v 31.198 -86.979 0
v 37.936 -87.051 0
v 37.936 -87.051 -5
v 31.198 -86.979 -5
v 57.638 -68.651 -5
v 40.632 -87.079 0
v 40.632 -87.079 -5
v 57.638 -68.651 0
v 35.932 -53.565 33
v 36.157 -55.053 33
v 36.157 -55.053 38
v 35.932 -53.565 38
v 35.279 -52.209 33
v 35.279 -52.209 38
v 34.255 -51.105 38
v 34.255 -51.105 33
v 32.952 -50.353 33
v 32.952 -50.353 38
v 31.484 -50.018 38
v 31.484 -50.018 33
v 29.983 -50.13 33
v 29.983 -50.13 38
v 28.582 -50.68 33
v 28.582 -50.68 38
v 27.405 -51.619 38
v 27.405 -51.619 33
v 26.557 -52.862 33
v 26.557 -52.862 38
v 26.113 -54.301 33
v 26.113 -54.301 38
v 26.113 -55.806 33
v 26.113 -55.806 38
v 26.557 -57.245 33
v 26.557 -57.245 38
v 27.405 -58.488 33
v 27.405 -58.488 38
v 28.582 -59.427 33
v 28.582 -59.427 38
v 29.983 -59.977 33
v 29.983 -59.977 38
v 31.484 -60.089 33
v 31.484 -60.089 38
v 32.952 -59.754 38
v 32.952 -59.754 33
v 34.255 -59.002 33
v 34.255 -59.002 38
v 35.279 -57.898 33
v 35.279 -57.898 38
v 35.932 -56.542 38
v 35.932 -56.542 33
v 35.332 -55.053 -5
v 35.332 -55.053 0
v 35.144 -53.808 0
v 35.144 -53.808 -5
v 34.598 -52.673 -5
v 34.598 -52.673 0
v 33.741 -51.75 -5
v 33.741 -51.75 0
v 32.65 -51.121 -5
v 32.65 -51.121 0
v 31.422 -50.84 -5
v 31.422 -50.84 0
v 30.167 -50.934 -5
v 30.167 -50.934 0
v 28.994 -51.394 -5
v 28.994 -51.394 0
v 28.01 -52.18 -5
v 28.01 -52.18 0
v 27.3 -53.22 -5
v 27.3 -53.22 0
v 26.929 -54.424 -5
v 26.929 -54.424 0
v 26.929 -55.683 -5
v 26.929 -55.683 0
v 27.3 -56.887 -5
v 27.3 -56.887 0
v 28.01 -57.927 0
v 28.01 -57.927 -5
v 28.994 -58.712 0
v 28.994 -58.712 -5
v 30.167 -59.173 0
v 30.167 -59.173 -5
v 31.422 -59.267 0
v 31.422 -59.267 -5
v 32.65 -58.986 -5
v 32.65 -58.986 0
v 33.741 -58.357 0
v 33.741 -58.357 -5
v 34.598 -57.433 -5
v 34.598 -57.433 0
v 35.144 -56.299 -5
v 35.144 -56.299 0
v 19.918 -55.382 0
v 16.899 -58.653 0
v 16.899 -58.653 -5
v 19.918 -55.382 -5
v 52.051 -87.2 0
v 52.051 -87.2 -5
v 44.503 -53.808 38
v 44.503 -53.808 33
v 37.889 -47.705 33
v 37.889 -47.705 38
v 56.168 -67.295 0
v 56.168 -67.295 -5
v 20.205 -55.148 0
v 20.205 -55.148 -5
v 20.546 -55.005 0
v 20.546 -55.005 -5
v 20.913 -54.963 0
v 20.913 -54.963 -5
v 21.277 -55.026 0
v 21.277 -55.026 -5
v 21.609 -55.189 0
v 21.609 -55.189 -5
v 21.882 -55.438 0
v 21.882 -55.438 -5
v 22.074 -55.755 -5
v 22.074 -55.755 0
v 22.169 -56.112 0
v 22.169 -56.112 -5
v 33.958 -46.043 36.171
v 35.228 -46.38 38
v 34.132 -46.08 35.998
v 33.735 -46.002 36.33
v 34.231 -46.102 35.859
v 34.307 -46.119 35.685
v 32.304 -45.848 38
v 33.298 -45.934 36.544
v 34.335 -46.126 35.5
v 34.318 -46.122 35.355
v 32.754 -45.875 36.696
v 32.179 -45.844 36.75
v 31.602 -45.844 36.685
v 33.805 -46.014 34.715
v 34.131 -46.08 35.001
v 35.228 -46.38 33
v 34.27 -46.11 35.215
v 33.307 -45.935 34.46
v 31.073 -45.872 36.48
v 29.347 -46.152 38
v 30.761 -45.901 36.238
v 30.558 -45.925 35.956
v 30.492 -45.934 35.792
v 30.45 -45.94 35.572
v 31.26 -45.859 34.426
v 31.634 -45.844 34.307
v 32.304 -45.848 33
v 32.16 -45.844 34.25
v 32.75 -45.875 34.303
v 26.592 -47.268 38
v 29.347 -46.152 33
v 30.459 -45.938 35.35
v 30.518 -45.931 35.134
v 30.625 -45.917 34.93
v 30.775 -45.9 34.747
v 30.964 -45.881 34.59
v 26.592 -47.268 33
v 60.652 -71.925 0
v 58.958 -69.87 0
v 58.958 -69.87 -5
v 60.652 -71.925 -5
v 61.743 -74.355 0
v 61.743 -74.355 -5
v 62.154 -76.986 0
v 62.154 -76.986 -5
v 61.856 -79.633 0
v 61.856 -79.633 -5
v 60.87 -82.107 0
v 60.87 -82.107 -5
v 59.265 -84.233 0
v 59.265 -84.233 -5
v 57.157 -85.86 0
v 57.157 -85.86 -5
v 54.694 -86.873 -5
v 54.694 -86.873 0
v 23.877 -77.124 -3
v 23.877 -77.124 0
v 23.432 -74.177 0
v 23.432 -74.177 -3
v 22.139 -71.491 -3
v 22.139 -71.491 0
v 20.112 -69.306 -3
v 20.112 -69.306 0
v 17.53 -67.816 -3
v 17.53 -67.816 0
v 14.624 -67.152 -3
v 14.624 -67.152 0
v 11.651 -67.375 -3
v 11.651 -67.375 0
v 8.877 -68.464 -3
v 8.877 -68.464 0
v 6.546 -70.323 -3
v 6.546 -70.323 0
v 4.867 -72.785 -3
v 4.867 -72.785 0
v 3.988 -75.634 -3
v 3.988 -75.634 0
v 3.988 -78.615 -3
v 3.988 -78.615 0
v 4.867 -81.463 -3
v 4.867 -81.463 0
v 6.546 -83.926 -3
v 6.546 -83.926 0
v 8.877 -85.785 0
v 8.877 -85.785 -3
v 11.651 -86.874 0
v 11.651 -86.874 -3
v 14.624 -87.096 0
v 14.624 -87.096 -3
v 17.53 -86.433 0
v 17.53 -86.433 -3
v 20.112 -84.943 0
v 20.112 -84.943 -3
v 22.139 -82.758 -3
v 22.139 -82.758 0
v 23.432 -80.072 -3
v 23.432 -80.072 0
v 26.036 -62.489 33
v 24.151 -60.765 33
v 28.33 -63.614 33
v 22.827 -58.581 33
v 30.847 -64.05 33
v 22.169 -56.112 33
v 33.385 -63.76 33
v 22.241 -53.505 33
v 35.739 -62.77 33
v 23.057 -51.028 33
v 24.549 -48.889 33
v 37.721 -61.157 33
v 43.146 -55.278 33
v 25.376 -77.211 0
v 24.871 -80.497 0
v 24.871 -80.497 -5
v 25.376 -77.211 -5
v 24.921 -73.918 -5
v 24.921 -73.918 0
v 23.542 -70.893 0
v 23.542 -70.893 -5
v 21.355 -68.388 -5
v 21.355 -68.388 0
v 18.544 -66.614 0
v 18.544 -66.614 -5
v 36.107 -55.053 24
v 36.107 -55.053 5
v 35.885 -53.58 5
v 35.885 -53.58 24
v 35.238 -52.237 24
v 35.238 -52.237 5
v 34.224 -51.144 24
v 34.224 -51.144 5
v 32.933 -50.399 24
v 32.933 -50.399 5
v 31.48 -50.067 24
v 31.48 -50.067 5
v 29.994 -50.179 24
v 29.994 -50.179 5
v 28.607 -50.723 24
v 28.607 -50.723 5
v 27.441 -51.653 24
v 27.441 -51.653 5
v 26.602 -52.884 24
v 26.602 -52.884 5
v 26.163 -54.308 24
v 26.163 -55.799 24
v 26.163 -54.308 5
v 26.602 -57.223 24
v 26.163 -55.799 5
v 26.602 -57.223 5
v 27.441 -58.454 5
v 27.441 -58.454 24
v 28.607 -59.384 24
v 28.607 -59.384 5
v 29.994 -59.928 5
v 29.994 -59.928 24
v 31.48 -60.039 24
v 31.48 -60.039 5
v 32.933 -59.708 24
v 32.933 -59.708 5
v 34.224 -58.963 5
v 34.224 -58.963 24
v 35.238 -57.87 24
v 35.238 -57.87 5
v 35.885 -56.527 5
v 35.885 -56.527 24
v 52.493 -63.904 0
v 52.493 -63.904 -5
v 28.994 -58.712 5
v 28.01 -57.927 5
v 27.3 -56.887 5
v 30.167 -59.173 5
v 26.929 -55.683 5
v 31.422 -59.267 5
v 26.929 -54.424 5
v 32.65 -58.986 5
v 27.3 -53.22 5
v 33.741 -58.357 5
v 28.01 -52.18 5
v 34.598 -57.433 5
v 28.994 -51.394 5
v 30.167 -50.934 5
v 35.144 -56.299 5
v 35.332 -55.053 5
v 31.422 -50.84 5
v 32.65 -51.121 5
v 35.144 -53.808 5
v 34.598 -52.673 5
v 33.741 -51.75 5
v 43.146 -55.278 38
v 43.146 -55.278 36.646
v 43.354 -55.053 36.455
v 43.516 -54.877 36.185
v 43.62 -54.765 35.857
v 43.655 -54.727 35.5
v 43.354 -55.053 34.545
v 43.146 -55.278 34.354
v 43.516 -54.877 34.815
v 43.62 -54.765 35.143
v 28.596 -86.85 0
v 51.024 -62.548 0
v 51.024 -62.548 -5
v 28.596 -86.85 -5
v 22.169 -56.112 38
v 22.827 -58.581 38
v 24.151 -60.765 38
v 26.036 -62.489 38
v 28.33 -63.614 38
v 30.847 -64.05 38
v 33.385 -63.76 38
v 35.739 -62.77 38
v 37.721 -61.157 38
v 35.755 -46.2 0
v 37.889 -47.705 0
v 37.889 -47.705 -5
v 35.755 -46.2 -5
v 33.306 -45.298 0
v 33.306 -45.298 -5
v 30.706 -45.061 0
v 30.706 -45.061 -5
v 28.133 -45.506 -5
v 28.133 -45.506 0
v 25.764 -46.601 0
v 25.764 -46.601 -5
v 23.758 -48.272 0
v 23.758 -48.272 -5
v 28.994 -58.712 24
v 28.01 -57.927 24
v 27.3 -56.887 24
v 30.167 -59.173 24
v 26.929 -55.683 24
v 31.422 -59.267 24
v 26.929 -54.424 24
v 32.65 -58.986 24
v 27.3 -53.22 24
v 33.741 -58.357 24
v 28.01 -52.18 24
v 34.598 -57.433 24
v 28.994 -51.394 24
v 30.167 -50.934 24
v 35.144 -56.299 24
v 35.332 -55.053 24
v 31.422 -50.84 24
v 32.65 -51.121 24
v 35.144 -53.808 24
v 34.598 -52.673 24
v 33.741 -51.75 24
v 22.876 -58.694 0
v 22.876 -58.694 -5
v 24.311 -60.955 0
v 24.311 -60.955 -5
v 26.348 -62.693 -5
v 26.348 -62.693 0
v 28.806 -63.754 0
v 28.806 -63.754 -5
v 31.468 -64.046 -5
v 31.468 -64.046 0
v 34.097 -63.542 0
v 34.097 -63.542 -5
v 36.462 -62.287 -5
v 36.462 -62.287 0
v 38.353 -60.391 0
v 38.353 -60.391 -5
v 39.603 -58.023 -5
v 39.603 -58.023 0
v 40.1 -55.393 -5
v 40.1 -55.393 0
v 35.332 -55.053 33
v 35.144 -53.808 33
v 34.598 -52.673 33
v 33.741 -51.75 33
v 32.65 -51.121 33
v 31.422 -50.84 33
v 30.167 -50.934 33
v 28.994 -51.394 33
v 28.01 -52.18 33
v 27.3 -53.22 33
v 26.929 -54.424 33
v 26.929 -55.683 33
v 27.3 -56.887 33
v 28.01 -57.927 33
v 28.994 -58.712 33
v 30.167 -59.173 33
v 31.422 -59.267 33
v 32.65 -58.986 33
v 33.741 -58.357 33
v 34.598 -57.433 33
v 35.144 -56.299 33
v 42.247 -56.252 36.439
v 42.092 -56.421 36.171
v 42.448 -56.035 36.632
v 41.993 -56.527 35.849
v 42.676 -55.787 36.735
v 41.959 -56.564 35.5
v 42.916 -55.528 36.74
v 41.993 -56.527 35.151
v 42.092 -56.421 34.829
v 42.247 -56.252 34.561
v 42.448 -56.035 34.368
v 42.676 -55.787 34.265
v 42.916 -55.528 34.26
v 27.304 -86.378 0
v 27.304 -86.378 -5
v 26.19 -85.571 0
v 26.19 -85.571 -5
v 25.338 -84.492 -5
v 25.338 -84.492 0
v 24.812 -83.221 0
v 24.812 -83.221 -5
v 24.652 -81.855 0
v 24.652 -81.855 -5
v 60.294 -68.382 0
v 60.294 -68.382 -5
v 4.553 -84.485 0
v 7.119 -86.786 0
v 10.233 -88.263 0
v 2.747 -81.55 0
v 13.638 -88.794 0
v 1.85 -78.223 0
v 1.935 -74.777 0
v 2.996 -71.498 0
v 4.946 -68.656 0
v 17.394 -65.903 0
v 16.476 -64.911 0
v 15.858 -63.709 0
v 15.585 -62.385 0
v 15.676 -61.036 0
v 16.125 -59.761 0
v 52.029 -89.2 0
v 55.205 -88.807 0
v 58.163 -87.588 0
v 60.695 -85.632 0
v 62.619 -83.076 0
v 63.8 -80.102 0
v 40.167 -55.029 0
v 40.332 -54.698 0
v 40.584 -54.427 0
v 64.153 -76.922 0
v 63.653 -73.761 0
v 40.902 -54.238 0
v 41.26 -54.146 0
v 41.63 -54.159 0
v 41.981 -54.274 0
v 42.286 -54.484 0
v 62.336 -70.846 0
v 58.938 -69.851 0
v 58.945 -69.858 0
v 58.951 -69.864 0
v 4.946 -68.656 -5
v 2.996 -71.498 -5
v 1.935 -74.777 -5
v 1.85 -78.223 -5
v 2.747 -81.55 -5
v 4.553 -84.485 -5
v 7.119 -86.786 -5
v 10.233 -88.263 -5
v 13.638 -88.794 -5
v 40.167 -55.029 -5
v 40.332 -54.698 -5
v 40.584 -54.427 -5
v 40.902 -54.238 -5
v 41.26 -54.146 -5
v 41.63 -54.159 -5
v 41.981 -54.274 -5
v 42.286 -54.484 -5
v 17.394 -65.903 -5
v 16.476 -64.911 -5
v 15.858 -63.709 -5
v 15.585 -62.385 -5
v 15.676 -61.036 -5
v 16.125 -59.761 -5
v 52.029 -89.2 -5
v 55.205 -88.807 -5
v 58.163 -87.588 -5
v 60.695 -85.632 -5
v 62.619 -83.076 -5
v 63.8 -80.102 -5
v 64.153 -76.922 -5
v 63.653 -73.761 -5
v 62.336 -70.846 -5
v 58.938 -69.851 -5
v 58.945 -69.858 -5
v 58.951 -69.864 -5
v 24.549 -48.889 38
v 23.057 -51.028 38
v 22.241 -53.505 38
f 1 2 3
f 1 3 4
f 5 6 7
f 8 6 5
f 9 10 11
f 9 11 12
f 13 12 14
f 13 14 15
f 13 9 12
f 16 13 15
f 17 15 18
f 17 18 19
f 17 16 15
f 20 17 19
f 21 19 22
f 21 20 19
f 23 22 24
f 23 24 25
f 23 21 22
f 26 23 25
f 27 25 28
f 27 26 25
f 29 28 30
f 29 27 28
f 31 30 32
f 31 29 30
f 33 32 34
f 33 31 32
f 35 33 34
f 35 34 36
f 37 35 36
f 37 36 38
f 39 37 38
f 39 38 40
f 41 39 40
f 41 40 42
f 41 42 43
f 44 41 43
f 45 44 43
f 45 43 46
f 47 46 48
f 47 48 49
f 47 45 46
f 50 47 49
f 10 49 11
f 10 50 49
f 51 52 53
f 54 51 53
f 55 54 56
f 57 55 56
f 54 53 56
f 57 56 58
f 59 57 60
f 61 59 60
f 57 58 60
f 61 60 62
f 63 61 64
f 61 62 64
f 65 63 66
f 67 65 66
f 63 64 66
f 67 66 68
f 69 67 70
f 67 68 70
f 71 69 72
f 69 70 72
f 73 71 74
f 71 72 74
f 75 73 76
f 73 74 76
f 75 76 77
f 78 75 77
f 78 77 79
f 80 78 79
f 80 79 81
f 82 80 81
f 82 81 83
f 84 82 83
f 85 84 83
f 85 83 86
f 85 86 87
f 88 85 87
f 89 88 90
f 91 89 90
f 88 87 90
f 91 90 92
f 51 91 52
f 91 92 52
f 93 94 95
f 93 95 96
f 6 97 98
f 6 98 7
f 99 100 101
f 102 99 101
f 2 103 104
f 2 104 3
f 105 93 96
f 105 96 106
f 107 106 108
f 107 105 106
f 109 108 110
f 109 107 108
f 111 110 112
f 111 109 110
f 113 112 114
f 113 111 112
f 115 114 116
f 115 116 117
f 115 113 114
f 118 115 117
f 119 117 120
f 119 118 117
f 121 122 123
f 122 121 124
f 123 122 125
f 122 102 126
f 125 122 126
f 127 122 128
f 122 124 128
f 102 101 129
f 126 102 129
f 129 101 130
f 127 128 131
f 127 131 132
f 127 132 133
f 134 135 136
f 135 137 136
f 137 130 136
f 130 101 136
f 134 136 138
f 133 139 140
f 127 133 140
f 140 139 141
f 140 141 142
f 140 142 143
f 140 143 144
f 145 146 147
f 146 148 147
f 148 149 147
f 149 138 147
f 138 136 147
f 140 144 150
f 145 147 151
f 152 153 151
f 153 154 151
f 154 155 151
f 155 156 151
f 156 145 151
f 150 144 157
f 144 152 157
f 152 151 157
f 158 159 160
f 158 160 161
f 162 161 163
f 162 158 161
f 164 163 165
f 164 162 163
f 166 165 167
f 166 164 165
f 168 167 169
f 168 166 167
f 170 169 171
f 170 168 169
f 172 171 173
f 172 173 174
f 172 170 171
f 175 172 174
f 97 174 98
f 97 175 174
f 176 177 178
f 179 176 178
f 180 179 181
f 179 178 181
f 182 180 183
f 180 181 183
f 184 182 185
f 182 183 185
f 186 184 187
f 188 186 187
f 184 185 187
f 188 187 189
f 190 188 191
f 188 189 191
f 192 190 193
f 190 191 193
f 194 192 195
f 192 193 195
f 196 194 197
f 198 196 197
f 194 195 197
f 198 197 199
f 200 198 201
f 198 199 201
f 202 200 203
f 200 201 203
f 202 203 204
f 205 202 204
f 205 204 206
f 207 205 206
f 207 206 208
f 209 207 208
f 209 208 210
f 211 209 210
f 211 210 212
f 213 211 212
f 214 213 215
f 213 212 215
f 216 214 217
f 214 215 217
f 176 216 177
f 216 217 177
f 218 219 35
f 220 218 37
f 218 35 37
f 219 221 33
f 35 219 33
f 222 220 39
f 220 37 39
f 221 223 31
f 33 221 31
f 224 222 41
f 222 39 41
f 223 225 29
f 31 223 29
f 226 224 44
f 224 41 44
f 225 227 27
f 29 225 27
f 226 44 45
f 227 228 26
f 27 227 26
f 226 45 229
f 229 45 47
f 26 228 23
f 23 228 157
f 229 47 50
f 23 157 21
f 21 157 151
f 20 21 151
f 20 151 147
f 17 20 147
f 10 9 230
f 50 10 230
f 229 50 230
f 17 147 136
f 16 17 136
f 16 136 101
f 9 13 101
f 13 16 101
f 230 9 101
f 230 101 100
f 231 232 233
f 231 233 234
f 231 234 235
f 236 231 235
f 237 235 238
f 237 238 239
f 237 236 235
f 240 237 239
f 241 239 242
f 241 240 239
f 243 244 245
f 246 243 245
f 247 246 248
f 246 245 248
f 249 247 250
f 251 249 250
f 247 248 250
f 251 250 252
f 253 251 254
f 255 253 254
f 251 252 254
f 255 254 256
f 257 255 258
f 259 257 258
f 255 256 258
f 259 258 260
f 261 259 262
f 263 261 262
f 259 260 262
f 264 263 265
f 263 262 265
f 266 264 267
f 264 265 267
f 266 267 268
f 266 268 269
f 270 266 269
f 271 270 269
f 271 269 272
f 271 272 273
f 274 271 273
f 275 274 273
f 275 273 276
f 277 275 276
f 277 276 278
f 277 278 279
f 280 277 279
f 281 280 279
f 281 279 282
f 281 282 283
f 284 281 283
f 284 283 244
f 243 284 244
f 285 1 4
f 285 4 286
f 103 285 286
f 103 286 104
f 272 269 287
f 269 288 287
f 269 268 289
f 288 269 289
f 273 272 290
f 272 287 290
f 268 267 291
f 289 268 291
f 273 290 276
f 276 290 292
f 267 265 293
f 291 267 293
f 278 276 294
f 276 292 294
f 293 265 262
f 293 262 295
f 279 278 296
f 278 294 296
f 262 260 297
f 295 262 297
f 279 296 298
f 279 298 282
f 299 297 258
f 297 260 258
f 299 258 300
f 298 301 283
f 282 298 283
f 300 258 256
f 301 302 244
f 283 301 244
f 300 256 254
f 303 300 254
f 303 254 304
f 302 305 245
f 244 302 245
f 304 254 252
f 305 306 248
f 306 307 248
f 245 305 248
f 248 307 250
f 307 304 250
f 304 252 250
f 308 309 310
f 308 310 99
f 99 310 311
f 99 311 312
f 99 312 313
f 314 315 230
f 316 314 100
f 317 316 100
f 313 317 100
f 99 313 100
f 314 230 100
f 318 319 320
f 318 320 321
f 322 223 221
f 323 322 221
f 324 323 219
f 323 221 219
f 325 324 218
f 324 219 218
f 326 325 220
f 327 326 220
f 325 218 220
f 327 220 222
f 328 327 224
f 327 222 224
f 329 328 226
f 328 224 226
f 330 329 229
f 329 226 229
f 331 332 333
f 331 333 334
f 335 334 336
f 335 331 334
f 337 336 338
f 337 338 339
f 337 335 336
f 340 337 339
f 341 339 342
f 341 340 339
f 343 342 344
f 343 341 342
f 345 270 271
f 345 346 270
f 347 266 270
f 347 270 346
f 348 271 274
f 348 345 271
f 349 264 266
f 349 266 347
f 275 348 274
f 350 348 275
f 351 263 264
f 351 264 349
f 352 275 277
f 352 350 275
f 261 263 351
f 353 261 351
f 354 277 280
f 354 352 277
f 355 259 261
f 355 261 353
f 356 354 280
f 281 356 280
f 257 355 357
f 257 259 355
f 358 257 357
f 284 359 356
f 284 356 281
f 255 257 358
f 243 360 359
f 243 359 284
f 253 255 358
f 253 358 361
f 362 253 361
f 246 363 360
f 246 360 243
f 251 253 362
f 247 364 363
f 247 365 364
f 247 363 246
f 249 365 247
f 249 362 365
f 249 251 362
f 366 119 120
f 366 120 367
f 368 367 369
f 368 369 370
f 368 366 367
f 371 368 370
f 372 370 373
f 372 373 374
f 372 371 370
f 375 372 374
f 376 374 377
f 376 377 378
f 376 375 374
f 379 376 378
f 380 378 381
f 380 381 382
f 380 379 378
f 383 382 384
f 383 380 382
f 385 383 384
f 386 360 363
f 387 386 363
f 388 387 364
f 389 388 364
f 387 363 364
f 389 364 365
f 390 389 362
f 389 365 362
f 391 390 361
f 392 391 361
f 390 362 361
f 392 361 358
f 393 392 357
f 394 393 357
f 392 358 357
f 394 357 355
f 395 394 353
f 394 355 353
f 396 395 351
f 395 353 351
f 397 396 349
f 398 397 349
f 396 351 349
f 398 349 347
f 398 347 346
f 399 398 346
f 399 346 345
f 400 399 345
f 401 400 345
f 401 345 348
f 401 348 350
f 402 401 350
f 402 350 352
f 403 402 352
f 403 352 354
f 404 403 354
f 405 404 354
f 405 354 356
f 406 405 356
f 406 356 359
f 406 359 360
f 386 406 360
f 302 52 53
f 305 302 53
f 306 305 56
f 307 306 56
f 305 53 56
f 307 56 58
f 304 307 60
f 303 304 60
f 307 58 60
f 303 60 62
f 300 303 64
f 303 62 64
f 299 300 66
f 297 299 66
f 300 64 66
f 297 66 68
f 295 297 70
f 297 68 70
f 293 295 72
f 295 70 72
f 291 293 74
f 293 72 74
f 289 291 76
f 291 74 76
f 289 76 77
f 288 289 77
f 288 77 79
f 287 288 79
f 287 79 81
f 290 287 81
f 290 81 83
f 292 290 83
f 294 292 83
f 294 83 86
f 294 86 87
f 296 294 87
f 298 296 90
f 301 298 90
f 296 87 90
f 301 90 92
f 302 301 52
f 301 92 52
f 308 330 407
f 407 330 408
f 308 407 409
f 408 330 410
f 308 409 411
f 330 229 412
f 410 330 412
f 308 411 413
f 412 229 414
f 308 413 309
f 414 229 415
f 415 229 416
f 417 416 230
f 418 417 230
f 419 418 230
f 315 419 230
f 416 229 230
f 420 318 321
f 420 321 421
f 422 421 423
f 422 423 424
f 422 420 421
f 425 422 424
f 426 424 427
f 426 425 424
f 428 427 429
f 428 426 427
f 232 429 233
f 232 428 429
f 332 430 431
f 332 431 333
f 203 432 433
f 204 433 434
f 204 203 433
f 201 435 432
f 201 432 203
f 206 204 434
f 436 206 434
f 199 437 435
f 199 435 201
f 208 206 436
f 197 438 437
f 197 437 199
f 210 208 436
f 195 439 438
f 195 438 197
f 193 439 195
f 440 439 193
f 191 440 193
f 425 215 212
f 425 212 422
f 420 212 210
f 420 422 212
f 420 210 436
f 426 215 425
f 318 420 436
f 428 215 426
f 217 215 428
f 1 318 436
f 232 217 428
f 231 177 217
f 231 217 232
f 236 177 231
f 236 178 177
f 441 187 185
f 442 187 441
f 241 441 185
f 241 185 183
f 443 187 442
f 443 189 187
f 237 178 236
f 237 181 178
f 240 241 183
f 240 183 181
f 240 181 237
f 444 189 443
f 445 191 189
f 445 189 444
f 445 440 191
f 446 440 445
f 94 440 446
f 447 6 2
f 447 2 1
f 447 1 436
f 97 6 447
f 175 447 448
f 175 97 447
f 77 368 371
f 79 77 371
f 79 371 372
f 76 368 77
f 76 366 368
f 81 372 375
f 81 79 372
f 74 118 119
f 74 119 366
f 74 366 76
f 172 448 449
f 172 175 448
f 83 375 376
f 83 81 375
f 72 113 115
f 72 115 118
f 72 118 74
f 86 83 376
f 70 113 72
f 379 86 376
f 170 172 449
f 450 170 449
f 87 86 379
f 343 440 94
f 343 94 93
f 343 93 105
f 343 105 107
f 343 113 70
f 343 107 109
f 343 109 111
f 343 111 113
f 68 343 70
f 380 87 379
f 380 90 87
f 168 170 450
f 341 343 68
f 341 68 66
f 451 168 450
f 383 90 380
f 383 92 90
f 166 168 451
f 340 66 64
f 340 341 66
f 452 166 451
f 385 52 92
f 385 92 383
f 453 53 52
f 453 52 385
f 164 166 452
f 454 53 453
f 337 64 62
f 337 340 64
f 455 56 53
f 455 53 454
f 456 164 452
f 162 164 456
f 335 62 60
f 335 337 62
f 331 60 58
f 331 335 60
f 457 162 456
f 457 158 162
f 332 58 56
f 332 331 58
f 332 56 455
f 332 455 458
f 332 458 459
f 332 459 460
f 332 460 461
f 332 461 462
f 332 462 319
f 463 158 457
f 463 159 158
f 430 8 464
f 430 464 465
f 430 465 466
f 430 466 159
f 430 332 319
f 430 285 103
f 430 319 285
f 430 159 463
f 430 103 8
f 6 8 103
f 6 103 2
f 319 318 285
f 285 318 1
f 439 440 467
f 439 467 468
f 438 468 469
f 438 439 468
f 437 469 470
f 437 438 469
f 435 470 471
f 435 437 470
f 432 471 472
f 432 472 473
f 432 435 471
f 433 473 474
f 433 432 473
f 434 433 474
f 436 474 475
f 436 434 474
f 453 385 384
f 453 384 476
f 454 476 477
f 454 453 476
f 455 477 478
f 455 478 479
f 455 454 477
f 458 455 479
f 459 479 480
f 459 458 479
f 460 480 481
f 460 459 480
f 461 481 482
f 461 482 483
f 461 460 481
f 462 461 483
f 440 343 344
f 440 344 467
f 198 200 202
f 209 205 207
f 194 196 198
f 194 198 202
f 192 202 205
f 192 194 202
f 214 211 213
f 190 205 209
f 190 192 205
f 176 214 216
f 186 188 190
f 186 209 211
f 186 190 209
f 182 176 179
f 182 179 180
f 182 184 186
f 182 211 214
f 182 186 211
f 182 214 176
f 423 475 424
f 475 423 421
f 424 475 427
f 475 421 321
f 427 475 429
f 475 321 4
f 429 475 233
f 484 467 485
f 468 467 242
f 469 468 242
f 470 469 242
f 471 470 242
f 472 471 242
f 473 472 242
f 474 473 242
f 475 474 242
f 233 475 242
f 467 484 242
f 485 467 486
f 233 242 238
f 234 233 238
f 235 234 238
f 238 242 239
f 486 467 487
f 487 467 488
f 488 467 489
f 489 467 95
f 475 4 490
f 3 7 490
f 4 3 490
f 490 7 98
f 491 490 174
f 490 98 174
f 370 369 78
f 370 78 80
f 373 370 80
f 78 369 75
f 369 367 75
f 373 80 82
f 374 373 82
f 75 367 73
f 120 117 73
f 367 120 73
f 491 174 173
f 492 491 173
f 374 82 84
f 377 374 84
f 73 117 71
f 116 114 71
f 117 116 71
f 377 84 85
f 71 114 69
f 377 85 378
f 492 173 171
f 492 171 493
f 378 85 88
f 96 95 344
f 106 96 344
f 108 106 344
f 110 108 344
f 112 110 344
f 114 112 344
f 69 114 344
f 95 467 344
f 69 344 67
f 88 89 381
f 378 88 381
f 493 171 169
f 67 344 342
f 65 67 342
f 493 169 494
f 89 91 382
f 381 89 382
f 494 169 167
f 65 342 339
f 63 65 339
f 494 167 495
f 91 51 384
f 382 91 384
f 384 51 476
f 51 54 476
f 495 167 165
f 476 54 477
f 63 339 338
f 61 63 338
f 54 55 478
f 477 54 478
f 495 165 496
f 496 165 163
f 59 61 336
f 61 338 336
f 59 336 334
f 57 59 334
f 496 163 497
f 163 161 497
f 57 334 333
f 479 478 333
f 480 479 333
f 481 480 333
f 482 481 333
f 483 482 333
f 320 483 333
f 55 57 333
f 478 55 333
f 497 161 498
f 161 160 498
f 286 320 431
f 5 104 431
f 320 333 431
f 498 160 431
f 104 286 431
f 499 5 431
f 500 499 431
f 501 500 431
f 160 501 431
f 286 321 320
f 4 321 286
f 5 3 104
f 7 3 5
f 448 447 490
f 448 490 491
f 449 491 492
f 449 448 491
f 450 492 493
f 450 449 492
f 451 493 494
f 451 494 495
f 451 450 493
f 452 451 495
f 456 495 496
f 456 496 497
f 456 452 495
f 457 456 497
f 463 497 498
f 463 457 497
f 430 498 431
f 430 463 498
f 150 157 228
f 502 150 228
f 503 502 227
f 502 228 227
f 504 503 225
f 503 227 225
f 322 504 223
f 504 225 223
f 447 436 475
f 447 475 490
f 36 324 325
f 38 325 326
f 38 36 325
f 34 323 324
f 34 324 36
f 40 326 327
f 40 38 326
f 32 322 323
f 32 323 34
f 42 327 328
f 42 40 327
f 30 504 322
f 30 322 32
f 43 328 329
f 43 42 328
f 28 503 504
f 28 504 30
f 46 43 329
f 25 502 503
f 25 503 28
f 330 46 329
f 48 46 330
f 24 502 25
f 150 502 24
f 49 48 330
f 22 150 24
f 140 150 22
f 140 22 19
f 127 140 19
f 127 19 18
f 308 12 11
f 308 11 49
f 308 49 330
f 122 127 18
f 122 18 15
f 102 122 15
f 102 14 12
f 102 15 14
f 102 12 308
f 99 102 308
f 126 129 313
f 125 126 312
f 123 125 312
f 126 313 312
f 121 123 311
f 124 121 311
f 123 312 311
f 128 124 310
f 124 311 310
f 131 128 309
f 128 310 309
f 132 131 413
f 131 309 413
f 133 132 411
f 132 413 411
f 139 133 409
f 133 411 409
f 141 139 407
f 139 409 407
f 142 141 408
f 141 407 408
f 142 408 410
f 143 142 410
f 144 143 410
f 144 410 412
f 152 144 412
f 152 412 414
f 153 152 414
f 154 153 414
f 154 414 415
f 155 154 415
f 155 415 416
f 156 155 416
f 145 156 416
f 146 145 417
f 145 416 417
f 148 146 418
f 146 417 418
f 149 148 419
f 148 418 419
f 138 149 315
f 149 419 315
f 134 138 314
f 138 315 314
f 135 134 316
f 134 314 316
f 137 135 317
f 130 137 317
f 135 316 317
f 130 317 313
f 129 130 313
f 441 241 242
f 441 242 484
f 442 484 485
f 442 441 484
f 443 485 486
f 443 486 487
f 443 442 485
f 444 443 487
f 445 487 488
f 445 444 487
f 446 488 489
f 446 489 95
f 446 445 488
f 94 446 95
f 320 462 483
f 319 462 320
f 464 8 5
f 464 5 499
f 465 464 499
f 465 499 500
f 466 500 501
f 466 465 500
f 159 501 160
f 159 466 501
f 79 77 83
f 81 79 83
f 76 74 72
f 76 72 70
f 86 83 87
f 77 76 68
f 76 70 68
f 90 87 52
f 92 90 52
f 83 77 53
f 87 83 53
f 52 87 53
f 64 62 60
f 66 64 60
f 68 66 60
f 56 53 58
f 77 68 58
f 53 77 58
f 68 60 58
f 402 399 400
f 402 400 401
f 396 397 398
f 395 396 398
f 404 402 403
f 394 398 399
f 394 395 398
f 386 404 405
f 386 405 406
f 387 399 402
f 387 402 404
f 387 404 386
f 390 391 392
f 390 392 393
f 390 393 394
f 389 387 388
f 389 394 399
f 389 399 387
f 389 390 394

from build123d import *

# Parameters (mm, degrees)
F0_R     = 10
F0_R_2   = 5
F0_R_3   = 4.225
F1_DEPTH = 5
F2_DEPTH = 33
F3_DEPTH = 24
F4_DEPTH = 3
F5_DEPTH = 5
F6_R     = 5.05
F7_DEPTH = 5
F8_R     = 1.25
F9_DEPTH = 37.3461542928


# Not quite as in the source:
# - a feature names something its author has since deleted; it is built from what else it names


with BuildPart() as f1:
    # F0 (on Top) → F1 (new body)
    with BuildSketch(Plane.XY):
        with BuildLine():
            ThreePointArc((37.8886156331, -47.7045562268), (30.7058016888, -45.0614846038), (23.757851373, -48.271567184))
            Line((23.757851373, -48.271567184), (4.9458403192, -68.6563901516))
            ThreePointArc((4.9458403192, -68.6563901516), (2.7469798041, -81.5500736227), (13.6377095304, -88.793972231))
            Line((13.6377095304, -88.793972231), (52.0294167207, -89.1996541952))
            ThreePointArc((52.0294167207, -89.1996541952), (63.3093775894, -81.6282933397), (60.2944646217, -68.3816589671))
            Line((60.2944646217, -68.3816589671), (37.8886156331, -47.7045562268))
        make_face()
        with Locations((13.8766520367, -77.1243319886)):
            Circle(F0_R, mode=Mode.SUBTRACT)
        with BuildLine():
            ThreePointArc((19.9178327929, -55.3816736395), (21.2773906019, -55.0259616092), (22.1692135687, -56.1120464494))
            ThreePointArc((22.1692135687, -56.1120464494), (31.4675825452, -64.046207144), (40.1003485207, -55.3925418418))
            ThreePointArc((40.1003485207, -55.3925418418), (40.9022839083, -54.2384932646), (42.285971428, -54.4841298503))
            Line((42.285971428, -54.4841298503), (51.0236458615, -62.5476400554))
            Line((51.0236458615, -62.5476400554), (52.4934233832, -63.9040153856))
            Line((52.4934233832, -63.9040153856), (56.1678671876, -67.2949537114))
            Line((56.1678671876, -67.2949537114), (57.6376447093, -68.6513290416))
            Line((57.6376447093, -68.6513290416), (58.9380892914, -69.8514364888))
            ThreePointArc((58.9380892914, -69.8514364888), (58.9480578825, -69.8606484779), (58.9580139608, -69.8698739891))
            ThreePointArc((58.9580139608, -69.8698739891), (61.4454997037, -80.9029104703), (52.0505493739, -87.1997658456))
            Line((52.0505493739, -87.1997658456), (40.6316839441, -87.0791036481))
            Line((40.6316839441, -87.0791036481), (37.9364663461, -87.0506235088))
            Line((37.9364663461, -87.0506235088), (31.1984223512, -86.9794231605))
            Line((31.1984223512, -86.9794231605), (29.5984604838, -86.962516497))
            ThreePointArc((29.5984604838, -86.962516497), (29.0944782553, -86.9316947288), (28.5961743715, -86.8502005114))
            ThreePointArc((28.5961743715, -86.8502005114), (25.3379647523, -84.491670283), (24.8710981532, -80.4965945217))
            ThreePointArc((24.8710981532, -80.4965945217), (24.3410382572, -72.3549902073), (18.5438366298, -66.6139852782))
            ThreePointArc((18.5438366298, -66.6139852782), (15.67652582, -63.0562363009), (16.8986035181, -58.6533309914))
            Line((16.8986035181, -58.6533309914), (19.9178327929, -55.3816736395))
        make_face(mode=Mode.SUBTRACT)
        with Locations((31.1067389816, -55.0534438355)):
            Circle(F0_R_2, mode=Mode.SUBTRACT)
        with Locations((13.8766520367, -77.1243319886)):
            Circle(F0_R)
        with Locations((31.1067389816, -55.0534438355)):
            Circle(F0_R_2)
        with Locations((31.1067389816, -55.0534438355)):
            Circle(F0_R_3, mode=Mode.SUBTRACT)
        with BuildLine():
            Line((52.4934233832, -63.9040153856), (51.0236458615, -62.5476400554))
            Line((51.0236458615, -62.5476400554), (28.5961743715, -86.8502005114))
            ThreePointArc((28.5961743715, -86.8502005114), (29.0944782553, -86.9316947288), (29.5984604838, -86.962516497))
            Line((29.5984604838, -86.962516497), (31.1984223512, -86.9794231605))
            Line((31.1984223512, -86.9794231605), (52.4934233832, -63.9040153856))
        make_face()
        Polygon((57.6376447093, -68.6513290416), (56.1678671876, -67.2949537114), (37.9364663461, -87.0506235088), (40.6316839441, -87.0791036481), align=None)
    extrude(amount=-F1_DEPTH)



with BuildPart() as f2:
    # F0 (on Top) → F2 (new body)
    with BuildSketch(Plane.XY):
        with Locations((31.1067389816, -55.0534438355)):
            Circle(F0_R_3)
    extrude(amount=F2_DEPTH)


with BuildPart() as f1_1:
    add(f1.part)

    add(f2.part)  # F3 merges F2
    # F0 (on Top) → F3 (join)
    with BuildSketch(Plane.XY):
        with Locations((31.1067389816, -55.0534438355)):
            Circle(F0_R_2)
        with Locations((31.1067389816, -55.0534438355)):
            Circle(F0_R_3, mode=Mode.SUBTRACT)
    extrude(amount=F3_DEPTH)

    # F0 (on Top) → F4 (cut)
    with BuildSketch(Plane.XY):
        with Locations((13.8766520367, -77.1243319886)):
            Circle(F0_R)
    extrude(amount=-F4_DEPTH, mode=Mode.SUBTRACT)

    # F0 (on Top) → F5 (cut)
    with BuildSketch(Plane.XY):
        with Locations((31.1067389816, -55.0534438355)):
            Circle(F0_R_2)
        with Locations((31.1067389816, -55.0534438355)):
            Circle(F0_R_3, mode=Mode.SUBTRACT)
    extrude(amount=F5_DEPTH, mode=Mode.SUBTRACT)


with BuildPart() as f7:
    # F6 (on face) → F7 (new body)
    with BuildSketch(Plane.XY.offset(33)):
        with BuildLine():
            ThreePointArc((26.5920293669, -47.2677263287), (23.0571330032, -51.0280440303), (22.1692135687, -56.1120464494))
            ThreePointArc((22.1692135687, -56.1120464494), (28.3295249008, -63.6142312963), (37.7207378294, -61.1571328217))
            Line((37.7207378294, -61.1571328217), (43.1462391506, -55.2780227348))
            Line((43.1462391506, -55.2780227348), (44.5026144809, -53.8082452131))
            Line((44.5026144809, -53.8082452131), (37.8886156331, -47.7045562268))
            ThreePointArc((37.8886156331, -47.7045562268), (32.303661001, -45.8481837024), (26.5920293669, -47.2677263287))
        make_face()
        with Locations((31.1067389816, -55.0534438355)):
            Circle(F6_R, mode=Mode.SUBTRACT)
    extrude(amount=F7_DEPTH)

    # F8 (on face) → F9 (cut, through all)
    with BuildSketch(Plane(origin=(50.851773792, -46.9282530538, 0), x_dir=(0.6781876651, 0.7348887609, 0), z_dir=(0.7348887609, -0.6781876651, 0))):
        with Locations((-11.8619504415, 35.5)):
            Circle(F8_R)
    extrude(amount=-F9_DEPTH, mode=Mode.SUBTRACT)


solid = Compound([f1_1.part, f7.part])
